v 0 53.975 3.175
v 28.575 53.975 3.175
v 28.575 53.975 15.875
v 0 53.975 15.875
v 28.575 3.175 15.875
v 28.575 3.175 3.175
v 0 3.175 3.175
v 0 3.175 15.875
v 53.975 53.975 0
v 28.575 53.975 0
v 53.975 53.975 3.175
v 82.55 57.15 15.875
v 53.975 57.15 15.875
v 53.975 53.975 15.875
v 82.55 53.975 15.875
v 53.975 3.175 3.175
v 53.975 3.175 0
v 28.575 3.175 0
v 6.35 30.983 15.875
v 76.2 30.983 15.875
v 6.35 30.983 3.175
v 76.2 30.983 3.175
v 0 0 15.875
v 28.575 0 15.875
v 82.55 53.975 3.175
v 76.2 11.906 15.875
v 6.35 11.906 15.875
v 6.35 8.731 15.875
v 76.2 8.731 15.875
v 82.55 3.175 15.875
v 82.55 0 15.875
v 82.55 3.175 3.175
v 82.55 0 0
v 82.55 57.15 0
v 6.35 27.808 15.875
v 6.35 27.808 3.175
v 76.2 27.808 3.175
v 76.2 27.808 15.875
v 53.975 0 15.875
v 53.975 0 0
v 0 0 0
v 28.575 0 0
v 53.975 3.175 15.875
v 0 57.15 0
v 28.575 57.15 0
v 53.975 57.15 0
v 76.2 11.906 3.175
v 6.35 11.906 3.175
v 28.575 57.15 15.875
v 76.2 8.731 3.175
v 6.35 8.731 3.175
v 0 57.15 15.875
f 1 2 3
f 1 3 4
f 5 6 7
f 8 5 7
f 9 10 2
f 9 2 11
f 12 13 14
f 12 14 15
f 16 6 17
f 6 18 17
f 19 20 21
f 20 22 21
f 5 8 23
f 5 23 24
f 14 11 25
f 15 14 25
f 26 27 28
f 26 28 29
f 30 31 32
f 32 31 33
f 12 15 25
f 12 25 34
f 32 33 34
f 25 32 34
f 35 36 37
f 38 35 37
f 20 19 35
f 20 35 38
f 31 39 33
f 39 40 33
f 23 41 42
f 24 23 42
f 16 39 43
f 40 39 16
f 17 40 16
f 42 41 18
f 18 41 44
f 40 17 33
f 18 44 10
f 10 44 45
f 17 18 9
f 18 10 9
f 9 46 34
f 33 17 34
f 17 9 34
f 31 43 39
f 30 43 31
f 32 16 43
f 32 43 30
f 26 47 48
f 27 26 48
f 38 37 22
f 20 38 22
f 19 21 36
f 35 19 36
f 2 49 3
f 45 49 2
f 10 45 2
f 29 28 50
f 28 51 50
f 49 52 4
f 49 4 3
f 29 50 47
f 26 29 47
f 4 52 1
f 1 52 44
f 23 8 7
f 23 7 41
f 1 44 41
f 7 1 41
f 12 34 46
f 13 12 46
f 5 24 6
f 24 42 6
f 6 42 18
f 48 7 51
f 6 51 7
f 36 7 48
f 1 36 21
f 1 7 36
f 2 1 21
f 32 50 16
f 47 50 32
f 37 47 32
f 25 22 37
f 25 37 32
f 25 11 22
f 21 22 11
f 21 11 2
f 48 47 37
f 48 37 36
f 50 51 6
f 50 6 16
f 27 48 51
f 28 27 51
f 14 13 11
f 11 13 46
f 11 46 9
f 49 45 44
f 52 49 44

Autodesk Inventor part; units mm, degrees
ref_plane "YZ Plane" through (0, 0, 0) normal (1, 0, 0) x (0, 1, 0)
ref_plane "XZ Plane" through (0, 0, 0) normal (0, 1, 0) x (-1, 0, 0)
ref_plane "XY Plane" through (0, 0, 0) normal (0, 0, 1) x (1, 0, 0)
sketch "Sketch1" plane through (0, 0, 0) normal (0, 0, 1) x (1, 0, 0)
  line L0 (0, 0) -> (28.575, 0)
  line L1 (82.55, 0) -> (82.55, 57.15)
  line L2 (82.55, 57.15) -> (53.975, 57.15)
  line L3 (0, 57.15) -> (0, 0)
  line L4 (0, 53.975) -> (28.575, 53.975) construction
  line L5 (28.575, 57.15) -> (28.575, 53.975)
  line L6 (53.975, 57.15) -> (53.975, 53.975)
  line L7 (53.975, 53.975) -> (82.55, 53.975) construction
  line L8 (28.575, 53.975) -> (53.975, 53.975)
  line L9 (53.975, 57.15) -> (28.575, 57.15) construction
  line L10 (28.575, 57.15) -> (0, 57.15)
  line L11 (0, 3.175) -> (28.575, 3.175) construction
  line L12 (53.975, 0) -> (53.975, 3.175)
  line L13 (28.575, 0) -> (28.575, 3.175)
  line L14 (28.575, 0) -> (53.975, 0) construction
  line L15 (53.975, 0) -> (82.55, 0)
  line L16 (53.975, 3.175) -> (82.55, 3.175) construction
  line L17 (28.575, 3.175) -> (53.975, 3.175)
  dimension "d0" = 82.55
  dimension "d1" = 57.15
  dimension "d2" = 28.575
  dimension "d3" = 25.4
  dimension "d4" = 3.175
  dimension "d5" = 3.175
  dimension "d6" = 28.575
  dimension "d7" = 25.4
extrude "Extrusion1" add sketch "Sketch1" along normal blind 3.175
sketch "Sketch4" plane through (0, 0, 3.175) normal (0, 0, 1) x (1, 0, 0)
  line L0 (82.55, 0) -> (82.55, 57.15) projected
  line L1 (53.975, 53.975) -> (28.575, 53.975) projected
  line L2 (0, 57.15) -> (0, 0) projected
  line L3 (28.575, 3.175) -> (53.975, 3.175) projected
  line L4 (28.575, 3.175) -> (0, 3.175)
  line L5 (0, 3.175) -> (0, 0)
  line L6 (0, 0) -> (28.575, 0)
  line L7 (28.575, 0) -> (28.575, 3.175)
  line L8 (53.975, 3.175) -> (82.55, 3.175)
  line L9 (82.55, 3.175) -> (82.55, 0)
  line L10 (82.55, 0) -> (53.975, 0)
  line L11 (53.975, 0) -> (53.975, 3.175)
  line L12 (53.975, 53.975) -> (82.55, 53.975)
  line L13 (82.55, 53.975) -> (82.55, 57.15)
  line L14 (82.55, 57.15) -> (53.975, 57.15)
  line L15 (53.975, 57.15) -> (53.975, 53.975)
  line L16 (28.575, 53.975) -> (0, 53.975)
  line L17 (0, 53.975) -> (0, 57.15)
  line L18 (0, 57.15) -> (28.575, 57.15)
  line L19 (28.575, 57.15) -> (28.575, 53.975)
  line L20 (0, 28.575) -> (82.55, 28.575) construction
  line L21 (41.275, 53.975) -> (41.275, 3.175) construction
  line L22 (23.775, 47.2281) -> (58.775, 47.2281) construction
  line L23 (58.775, 47.2281) -> (58.775, 9.9219) construction
  line L24 (58.775, 9.9219) -> (23.775, 9.9219) construction
  line L25 (23.775, 9.9219) -> (23.775, 47.2281) construction
  line L26 (0, 27.3573) -> (82.55, 27.3573) construction
  line L27 (82.55, 12.3573) -> (0, 12.3573) construction
  line L28 (6.35, 8.7312) -> (76.2, 8.7312)
  line L29 (76.2, 8.7312) -> (76.2, 11.9062)
  line L30 (76.2, 11.9062) -> (6.35, 11.9062)
  line L31 (6.35, 11.9062) -> (6.35, 8.7312)
  line L32 (0, 19.8573) -> (82.55, 19.8573) construction
  line L33 (76.2, 27.8083) -> (76.2, 30.9833)
  line L34 (76.2, 30.9833) -> (6.35, 30.9833)
  line L35 (6.35, 30.9833) -> (6.35, 27.8083)
  line L36 (6.35, 27.8083) -> (76.2, 27.8083)
  dimension "d39" = 35
  dimension "d40" = 37.3062
  dimension "d41" = 15
  dimension "d42" = 2.4354
  dimension "d43" = 69.85
  dimension "d44" = 3.175
  dimension "d45" = 5.5563
  dimension "d46" = 0.451
  dimension "d47" = 69.85
extrude "Extrusion4" add sketch "Sketch4" along normal blind 12.7 contours L10 L11 L8 L0 | L12 L15 L14 L0 | L7 L6 L2 L4 | L16 L2 L18 L19 | L31 L30 L29 L28 | L36 L35 L34 L33
equation "\"d2\" = -0.5 * d3 + 0.5 * d0"
equation "\"d6\" = d2"
equation "\"d7\" = d3"
equation "\"d42\" = -0.666667 * d41 + 0.333333 * d40"
equation "\"d43\" = d47"
properties part number "Belt Aligners" material "Polyethylene, High Density"
